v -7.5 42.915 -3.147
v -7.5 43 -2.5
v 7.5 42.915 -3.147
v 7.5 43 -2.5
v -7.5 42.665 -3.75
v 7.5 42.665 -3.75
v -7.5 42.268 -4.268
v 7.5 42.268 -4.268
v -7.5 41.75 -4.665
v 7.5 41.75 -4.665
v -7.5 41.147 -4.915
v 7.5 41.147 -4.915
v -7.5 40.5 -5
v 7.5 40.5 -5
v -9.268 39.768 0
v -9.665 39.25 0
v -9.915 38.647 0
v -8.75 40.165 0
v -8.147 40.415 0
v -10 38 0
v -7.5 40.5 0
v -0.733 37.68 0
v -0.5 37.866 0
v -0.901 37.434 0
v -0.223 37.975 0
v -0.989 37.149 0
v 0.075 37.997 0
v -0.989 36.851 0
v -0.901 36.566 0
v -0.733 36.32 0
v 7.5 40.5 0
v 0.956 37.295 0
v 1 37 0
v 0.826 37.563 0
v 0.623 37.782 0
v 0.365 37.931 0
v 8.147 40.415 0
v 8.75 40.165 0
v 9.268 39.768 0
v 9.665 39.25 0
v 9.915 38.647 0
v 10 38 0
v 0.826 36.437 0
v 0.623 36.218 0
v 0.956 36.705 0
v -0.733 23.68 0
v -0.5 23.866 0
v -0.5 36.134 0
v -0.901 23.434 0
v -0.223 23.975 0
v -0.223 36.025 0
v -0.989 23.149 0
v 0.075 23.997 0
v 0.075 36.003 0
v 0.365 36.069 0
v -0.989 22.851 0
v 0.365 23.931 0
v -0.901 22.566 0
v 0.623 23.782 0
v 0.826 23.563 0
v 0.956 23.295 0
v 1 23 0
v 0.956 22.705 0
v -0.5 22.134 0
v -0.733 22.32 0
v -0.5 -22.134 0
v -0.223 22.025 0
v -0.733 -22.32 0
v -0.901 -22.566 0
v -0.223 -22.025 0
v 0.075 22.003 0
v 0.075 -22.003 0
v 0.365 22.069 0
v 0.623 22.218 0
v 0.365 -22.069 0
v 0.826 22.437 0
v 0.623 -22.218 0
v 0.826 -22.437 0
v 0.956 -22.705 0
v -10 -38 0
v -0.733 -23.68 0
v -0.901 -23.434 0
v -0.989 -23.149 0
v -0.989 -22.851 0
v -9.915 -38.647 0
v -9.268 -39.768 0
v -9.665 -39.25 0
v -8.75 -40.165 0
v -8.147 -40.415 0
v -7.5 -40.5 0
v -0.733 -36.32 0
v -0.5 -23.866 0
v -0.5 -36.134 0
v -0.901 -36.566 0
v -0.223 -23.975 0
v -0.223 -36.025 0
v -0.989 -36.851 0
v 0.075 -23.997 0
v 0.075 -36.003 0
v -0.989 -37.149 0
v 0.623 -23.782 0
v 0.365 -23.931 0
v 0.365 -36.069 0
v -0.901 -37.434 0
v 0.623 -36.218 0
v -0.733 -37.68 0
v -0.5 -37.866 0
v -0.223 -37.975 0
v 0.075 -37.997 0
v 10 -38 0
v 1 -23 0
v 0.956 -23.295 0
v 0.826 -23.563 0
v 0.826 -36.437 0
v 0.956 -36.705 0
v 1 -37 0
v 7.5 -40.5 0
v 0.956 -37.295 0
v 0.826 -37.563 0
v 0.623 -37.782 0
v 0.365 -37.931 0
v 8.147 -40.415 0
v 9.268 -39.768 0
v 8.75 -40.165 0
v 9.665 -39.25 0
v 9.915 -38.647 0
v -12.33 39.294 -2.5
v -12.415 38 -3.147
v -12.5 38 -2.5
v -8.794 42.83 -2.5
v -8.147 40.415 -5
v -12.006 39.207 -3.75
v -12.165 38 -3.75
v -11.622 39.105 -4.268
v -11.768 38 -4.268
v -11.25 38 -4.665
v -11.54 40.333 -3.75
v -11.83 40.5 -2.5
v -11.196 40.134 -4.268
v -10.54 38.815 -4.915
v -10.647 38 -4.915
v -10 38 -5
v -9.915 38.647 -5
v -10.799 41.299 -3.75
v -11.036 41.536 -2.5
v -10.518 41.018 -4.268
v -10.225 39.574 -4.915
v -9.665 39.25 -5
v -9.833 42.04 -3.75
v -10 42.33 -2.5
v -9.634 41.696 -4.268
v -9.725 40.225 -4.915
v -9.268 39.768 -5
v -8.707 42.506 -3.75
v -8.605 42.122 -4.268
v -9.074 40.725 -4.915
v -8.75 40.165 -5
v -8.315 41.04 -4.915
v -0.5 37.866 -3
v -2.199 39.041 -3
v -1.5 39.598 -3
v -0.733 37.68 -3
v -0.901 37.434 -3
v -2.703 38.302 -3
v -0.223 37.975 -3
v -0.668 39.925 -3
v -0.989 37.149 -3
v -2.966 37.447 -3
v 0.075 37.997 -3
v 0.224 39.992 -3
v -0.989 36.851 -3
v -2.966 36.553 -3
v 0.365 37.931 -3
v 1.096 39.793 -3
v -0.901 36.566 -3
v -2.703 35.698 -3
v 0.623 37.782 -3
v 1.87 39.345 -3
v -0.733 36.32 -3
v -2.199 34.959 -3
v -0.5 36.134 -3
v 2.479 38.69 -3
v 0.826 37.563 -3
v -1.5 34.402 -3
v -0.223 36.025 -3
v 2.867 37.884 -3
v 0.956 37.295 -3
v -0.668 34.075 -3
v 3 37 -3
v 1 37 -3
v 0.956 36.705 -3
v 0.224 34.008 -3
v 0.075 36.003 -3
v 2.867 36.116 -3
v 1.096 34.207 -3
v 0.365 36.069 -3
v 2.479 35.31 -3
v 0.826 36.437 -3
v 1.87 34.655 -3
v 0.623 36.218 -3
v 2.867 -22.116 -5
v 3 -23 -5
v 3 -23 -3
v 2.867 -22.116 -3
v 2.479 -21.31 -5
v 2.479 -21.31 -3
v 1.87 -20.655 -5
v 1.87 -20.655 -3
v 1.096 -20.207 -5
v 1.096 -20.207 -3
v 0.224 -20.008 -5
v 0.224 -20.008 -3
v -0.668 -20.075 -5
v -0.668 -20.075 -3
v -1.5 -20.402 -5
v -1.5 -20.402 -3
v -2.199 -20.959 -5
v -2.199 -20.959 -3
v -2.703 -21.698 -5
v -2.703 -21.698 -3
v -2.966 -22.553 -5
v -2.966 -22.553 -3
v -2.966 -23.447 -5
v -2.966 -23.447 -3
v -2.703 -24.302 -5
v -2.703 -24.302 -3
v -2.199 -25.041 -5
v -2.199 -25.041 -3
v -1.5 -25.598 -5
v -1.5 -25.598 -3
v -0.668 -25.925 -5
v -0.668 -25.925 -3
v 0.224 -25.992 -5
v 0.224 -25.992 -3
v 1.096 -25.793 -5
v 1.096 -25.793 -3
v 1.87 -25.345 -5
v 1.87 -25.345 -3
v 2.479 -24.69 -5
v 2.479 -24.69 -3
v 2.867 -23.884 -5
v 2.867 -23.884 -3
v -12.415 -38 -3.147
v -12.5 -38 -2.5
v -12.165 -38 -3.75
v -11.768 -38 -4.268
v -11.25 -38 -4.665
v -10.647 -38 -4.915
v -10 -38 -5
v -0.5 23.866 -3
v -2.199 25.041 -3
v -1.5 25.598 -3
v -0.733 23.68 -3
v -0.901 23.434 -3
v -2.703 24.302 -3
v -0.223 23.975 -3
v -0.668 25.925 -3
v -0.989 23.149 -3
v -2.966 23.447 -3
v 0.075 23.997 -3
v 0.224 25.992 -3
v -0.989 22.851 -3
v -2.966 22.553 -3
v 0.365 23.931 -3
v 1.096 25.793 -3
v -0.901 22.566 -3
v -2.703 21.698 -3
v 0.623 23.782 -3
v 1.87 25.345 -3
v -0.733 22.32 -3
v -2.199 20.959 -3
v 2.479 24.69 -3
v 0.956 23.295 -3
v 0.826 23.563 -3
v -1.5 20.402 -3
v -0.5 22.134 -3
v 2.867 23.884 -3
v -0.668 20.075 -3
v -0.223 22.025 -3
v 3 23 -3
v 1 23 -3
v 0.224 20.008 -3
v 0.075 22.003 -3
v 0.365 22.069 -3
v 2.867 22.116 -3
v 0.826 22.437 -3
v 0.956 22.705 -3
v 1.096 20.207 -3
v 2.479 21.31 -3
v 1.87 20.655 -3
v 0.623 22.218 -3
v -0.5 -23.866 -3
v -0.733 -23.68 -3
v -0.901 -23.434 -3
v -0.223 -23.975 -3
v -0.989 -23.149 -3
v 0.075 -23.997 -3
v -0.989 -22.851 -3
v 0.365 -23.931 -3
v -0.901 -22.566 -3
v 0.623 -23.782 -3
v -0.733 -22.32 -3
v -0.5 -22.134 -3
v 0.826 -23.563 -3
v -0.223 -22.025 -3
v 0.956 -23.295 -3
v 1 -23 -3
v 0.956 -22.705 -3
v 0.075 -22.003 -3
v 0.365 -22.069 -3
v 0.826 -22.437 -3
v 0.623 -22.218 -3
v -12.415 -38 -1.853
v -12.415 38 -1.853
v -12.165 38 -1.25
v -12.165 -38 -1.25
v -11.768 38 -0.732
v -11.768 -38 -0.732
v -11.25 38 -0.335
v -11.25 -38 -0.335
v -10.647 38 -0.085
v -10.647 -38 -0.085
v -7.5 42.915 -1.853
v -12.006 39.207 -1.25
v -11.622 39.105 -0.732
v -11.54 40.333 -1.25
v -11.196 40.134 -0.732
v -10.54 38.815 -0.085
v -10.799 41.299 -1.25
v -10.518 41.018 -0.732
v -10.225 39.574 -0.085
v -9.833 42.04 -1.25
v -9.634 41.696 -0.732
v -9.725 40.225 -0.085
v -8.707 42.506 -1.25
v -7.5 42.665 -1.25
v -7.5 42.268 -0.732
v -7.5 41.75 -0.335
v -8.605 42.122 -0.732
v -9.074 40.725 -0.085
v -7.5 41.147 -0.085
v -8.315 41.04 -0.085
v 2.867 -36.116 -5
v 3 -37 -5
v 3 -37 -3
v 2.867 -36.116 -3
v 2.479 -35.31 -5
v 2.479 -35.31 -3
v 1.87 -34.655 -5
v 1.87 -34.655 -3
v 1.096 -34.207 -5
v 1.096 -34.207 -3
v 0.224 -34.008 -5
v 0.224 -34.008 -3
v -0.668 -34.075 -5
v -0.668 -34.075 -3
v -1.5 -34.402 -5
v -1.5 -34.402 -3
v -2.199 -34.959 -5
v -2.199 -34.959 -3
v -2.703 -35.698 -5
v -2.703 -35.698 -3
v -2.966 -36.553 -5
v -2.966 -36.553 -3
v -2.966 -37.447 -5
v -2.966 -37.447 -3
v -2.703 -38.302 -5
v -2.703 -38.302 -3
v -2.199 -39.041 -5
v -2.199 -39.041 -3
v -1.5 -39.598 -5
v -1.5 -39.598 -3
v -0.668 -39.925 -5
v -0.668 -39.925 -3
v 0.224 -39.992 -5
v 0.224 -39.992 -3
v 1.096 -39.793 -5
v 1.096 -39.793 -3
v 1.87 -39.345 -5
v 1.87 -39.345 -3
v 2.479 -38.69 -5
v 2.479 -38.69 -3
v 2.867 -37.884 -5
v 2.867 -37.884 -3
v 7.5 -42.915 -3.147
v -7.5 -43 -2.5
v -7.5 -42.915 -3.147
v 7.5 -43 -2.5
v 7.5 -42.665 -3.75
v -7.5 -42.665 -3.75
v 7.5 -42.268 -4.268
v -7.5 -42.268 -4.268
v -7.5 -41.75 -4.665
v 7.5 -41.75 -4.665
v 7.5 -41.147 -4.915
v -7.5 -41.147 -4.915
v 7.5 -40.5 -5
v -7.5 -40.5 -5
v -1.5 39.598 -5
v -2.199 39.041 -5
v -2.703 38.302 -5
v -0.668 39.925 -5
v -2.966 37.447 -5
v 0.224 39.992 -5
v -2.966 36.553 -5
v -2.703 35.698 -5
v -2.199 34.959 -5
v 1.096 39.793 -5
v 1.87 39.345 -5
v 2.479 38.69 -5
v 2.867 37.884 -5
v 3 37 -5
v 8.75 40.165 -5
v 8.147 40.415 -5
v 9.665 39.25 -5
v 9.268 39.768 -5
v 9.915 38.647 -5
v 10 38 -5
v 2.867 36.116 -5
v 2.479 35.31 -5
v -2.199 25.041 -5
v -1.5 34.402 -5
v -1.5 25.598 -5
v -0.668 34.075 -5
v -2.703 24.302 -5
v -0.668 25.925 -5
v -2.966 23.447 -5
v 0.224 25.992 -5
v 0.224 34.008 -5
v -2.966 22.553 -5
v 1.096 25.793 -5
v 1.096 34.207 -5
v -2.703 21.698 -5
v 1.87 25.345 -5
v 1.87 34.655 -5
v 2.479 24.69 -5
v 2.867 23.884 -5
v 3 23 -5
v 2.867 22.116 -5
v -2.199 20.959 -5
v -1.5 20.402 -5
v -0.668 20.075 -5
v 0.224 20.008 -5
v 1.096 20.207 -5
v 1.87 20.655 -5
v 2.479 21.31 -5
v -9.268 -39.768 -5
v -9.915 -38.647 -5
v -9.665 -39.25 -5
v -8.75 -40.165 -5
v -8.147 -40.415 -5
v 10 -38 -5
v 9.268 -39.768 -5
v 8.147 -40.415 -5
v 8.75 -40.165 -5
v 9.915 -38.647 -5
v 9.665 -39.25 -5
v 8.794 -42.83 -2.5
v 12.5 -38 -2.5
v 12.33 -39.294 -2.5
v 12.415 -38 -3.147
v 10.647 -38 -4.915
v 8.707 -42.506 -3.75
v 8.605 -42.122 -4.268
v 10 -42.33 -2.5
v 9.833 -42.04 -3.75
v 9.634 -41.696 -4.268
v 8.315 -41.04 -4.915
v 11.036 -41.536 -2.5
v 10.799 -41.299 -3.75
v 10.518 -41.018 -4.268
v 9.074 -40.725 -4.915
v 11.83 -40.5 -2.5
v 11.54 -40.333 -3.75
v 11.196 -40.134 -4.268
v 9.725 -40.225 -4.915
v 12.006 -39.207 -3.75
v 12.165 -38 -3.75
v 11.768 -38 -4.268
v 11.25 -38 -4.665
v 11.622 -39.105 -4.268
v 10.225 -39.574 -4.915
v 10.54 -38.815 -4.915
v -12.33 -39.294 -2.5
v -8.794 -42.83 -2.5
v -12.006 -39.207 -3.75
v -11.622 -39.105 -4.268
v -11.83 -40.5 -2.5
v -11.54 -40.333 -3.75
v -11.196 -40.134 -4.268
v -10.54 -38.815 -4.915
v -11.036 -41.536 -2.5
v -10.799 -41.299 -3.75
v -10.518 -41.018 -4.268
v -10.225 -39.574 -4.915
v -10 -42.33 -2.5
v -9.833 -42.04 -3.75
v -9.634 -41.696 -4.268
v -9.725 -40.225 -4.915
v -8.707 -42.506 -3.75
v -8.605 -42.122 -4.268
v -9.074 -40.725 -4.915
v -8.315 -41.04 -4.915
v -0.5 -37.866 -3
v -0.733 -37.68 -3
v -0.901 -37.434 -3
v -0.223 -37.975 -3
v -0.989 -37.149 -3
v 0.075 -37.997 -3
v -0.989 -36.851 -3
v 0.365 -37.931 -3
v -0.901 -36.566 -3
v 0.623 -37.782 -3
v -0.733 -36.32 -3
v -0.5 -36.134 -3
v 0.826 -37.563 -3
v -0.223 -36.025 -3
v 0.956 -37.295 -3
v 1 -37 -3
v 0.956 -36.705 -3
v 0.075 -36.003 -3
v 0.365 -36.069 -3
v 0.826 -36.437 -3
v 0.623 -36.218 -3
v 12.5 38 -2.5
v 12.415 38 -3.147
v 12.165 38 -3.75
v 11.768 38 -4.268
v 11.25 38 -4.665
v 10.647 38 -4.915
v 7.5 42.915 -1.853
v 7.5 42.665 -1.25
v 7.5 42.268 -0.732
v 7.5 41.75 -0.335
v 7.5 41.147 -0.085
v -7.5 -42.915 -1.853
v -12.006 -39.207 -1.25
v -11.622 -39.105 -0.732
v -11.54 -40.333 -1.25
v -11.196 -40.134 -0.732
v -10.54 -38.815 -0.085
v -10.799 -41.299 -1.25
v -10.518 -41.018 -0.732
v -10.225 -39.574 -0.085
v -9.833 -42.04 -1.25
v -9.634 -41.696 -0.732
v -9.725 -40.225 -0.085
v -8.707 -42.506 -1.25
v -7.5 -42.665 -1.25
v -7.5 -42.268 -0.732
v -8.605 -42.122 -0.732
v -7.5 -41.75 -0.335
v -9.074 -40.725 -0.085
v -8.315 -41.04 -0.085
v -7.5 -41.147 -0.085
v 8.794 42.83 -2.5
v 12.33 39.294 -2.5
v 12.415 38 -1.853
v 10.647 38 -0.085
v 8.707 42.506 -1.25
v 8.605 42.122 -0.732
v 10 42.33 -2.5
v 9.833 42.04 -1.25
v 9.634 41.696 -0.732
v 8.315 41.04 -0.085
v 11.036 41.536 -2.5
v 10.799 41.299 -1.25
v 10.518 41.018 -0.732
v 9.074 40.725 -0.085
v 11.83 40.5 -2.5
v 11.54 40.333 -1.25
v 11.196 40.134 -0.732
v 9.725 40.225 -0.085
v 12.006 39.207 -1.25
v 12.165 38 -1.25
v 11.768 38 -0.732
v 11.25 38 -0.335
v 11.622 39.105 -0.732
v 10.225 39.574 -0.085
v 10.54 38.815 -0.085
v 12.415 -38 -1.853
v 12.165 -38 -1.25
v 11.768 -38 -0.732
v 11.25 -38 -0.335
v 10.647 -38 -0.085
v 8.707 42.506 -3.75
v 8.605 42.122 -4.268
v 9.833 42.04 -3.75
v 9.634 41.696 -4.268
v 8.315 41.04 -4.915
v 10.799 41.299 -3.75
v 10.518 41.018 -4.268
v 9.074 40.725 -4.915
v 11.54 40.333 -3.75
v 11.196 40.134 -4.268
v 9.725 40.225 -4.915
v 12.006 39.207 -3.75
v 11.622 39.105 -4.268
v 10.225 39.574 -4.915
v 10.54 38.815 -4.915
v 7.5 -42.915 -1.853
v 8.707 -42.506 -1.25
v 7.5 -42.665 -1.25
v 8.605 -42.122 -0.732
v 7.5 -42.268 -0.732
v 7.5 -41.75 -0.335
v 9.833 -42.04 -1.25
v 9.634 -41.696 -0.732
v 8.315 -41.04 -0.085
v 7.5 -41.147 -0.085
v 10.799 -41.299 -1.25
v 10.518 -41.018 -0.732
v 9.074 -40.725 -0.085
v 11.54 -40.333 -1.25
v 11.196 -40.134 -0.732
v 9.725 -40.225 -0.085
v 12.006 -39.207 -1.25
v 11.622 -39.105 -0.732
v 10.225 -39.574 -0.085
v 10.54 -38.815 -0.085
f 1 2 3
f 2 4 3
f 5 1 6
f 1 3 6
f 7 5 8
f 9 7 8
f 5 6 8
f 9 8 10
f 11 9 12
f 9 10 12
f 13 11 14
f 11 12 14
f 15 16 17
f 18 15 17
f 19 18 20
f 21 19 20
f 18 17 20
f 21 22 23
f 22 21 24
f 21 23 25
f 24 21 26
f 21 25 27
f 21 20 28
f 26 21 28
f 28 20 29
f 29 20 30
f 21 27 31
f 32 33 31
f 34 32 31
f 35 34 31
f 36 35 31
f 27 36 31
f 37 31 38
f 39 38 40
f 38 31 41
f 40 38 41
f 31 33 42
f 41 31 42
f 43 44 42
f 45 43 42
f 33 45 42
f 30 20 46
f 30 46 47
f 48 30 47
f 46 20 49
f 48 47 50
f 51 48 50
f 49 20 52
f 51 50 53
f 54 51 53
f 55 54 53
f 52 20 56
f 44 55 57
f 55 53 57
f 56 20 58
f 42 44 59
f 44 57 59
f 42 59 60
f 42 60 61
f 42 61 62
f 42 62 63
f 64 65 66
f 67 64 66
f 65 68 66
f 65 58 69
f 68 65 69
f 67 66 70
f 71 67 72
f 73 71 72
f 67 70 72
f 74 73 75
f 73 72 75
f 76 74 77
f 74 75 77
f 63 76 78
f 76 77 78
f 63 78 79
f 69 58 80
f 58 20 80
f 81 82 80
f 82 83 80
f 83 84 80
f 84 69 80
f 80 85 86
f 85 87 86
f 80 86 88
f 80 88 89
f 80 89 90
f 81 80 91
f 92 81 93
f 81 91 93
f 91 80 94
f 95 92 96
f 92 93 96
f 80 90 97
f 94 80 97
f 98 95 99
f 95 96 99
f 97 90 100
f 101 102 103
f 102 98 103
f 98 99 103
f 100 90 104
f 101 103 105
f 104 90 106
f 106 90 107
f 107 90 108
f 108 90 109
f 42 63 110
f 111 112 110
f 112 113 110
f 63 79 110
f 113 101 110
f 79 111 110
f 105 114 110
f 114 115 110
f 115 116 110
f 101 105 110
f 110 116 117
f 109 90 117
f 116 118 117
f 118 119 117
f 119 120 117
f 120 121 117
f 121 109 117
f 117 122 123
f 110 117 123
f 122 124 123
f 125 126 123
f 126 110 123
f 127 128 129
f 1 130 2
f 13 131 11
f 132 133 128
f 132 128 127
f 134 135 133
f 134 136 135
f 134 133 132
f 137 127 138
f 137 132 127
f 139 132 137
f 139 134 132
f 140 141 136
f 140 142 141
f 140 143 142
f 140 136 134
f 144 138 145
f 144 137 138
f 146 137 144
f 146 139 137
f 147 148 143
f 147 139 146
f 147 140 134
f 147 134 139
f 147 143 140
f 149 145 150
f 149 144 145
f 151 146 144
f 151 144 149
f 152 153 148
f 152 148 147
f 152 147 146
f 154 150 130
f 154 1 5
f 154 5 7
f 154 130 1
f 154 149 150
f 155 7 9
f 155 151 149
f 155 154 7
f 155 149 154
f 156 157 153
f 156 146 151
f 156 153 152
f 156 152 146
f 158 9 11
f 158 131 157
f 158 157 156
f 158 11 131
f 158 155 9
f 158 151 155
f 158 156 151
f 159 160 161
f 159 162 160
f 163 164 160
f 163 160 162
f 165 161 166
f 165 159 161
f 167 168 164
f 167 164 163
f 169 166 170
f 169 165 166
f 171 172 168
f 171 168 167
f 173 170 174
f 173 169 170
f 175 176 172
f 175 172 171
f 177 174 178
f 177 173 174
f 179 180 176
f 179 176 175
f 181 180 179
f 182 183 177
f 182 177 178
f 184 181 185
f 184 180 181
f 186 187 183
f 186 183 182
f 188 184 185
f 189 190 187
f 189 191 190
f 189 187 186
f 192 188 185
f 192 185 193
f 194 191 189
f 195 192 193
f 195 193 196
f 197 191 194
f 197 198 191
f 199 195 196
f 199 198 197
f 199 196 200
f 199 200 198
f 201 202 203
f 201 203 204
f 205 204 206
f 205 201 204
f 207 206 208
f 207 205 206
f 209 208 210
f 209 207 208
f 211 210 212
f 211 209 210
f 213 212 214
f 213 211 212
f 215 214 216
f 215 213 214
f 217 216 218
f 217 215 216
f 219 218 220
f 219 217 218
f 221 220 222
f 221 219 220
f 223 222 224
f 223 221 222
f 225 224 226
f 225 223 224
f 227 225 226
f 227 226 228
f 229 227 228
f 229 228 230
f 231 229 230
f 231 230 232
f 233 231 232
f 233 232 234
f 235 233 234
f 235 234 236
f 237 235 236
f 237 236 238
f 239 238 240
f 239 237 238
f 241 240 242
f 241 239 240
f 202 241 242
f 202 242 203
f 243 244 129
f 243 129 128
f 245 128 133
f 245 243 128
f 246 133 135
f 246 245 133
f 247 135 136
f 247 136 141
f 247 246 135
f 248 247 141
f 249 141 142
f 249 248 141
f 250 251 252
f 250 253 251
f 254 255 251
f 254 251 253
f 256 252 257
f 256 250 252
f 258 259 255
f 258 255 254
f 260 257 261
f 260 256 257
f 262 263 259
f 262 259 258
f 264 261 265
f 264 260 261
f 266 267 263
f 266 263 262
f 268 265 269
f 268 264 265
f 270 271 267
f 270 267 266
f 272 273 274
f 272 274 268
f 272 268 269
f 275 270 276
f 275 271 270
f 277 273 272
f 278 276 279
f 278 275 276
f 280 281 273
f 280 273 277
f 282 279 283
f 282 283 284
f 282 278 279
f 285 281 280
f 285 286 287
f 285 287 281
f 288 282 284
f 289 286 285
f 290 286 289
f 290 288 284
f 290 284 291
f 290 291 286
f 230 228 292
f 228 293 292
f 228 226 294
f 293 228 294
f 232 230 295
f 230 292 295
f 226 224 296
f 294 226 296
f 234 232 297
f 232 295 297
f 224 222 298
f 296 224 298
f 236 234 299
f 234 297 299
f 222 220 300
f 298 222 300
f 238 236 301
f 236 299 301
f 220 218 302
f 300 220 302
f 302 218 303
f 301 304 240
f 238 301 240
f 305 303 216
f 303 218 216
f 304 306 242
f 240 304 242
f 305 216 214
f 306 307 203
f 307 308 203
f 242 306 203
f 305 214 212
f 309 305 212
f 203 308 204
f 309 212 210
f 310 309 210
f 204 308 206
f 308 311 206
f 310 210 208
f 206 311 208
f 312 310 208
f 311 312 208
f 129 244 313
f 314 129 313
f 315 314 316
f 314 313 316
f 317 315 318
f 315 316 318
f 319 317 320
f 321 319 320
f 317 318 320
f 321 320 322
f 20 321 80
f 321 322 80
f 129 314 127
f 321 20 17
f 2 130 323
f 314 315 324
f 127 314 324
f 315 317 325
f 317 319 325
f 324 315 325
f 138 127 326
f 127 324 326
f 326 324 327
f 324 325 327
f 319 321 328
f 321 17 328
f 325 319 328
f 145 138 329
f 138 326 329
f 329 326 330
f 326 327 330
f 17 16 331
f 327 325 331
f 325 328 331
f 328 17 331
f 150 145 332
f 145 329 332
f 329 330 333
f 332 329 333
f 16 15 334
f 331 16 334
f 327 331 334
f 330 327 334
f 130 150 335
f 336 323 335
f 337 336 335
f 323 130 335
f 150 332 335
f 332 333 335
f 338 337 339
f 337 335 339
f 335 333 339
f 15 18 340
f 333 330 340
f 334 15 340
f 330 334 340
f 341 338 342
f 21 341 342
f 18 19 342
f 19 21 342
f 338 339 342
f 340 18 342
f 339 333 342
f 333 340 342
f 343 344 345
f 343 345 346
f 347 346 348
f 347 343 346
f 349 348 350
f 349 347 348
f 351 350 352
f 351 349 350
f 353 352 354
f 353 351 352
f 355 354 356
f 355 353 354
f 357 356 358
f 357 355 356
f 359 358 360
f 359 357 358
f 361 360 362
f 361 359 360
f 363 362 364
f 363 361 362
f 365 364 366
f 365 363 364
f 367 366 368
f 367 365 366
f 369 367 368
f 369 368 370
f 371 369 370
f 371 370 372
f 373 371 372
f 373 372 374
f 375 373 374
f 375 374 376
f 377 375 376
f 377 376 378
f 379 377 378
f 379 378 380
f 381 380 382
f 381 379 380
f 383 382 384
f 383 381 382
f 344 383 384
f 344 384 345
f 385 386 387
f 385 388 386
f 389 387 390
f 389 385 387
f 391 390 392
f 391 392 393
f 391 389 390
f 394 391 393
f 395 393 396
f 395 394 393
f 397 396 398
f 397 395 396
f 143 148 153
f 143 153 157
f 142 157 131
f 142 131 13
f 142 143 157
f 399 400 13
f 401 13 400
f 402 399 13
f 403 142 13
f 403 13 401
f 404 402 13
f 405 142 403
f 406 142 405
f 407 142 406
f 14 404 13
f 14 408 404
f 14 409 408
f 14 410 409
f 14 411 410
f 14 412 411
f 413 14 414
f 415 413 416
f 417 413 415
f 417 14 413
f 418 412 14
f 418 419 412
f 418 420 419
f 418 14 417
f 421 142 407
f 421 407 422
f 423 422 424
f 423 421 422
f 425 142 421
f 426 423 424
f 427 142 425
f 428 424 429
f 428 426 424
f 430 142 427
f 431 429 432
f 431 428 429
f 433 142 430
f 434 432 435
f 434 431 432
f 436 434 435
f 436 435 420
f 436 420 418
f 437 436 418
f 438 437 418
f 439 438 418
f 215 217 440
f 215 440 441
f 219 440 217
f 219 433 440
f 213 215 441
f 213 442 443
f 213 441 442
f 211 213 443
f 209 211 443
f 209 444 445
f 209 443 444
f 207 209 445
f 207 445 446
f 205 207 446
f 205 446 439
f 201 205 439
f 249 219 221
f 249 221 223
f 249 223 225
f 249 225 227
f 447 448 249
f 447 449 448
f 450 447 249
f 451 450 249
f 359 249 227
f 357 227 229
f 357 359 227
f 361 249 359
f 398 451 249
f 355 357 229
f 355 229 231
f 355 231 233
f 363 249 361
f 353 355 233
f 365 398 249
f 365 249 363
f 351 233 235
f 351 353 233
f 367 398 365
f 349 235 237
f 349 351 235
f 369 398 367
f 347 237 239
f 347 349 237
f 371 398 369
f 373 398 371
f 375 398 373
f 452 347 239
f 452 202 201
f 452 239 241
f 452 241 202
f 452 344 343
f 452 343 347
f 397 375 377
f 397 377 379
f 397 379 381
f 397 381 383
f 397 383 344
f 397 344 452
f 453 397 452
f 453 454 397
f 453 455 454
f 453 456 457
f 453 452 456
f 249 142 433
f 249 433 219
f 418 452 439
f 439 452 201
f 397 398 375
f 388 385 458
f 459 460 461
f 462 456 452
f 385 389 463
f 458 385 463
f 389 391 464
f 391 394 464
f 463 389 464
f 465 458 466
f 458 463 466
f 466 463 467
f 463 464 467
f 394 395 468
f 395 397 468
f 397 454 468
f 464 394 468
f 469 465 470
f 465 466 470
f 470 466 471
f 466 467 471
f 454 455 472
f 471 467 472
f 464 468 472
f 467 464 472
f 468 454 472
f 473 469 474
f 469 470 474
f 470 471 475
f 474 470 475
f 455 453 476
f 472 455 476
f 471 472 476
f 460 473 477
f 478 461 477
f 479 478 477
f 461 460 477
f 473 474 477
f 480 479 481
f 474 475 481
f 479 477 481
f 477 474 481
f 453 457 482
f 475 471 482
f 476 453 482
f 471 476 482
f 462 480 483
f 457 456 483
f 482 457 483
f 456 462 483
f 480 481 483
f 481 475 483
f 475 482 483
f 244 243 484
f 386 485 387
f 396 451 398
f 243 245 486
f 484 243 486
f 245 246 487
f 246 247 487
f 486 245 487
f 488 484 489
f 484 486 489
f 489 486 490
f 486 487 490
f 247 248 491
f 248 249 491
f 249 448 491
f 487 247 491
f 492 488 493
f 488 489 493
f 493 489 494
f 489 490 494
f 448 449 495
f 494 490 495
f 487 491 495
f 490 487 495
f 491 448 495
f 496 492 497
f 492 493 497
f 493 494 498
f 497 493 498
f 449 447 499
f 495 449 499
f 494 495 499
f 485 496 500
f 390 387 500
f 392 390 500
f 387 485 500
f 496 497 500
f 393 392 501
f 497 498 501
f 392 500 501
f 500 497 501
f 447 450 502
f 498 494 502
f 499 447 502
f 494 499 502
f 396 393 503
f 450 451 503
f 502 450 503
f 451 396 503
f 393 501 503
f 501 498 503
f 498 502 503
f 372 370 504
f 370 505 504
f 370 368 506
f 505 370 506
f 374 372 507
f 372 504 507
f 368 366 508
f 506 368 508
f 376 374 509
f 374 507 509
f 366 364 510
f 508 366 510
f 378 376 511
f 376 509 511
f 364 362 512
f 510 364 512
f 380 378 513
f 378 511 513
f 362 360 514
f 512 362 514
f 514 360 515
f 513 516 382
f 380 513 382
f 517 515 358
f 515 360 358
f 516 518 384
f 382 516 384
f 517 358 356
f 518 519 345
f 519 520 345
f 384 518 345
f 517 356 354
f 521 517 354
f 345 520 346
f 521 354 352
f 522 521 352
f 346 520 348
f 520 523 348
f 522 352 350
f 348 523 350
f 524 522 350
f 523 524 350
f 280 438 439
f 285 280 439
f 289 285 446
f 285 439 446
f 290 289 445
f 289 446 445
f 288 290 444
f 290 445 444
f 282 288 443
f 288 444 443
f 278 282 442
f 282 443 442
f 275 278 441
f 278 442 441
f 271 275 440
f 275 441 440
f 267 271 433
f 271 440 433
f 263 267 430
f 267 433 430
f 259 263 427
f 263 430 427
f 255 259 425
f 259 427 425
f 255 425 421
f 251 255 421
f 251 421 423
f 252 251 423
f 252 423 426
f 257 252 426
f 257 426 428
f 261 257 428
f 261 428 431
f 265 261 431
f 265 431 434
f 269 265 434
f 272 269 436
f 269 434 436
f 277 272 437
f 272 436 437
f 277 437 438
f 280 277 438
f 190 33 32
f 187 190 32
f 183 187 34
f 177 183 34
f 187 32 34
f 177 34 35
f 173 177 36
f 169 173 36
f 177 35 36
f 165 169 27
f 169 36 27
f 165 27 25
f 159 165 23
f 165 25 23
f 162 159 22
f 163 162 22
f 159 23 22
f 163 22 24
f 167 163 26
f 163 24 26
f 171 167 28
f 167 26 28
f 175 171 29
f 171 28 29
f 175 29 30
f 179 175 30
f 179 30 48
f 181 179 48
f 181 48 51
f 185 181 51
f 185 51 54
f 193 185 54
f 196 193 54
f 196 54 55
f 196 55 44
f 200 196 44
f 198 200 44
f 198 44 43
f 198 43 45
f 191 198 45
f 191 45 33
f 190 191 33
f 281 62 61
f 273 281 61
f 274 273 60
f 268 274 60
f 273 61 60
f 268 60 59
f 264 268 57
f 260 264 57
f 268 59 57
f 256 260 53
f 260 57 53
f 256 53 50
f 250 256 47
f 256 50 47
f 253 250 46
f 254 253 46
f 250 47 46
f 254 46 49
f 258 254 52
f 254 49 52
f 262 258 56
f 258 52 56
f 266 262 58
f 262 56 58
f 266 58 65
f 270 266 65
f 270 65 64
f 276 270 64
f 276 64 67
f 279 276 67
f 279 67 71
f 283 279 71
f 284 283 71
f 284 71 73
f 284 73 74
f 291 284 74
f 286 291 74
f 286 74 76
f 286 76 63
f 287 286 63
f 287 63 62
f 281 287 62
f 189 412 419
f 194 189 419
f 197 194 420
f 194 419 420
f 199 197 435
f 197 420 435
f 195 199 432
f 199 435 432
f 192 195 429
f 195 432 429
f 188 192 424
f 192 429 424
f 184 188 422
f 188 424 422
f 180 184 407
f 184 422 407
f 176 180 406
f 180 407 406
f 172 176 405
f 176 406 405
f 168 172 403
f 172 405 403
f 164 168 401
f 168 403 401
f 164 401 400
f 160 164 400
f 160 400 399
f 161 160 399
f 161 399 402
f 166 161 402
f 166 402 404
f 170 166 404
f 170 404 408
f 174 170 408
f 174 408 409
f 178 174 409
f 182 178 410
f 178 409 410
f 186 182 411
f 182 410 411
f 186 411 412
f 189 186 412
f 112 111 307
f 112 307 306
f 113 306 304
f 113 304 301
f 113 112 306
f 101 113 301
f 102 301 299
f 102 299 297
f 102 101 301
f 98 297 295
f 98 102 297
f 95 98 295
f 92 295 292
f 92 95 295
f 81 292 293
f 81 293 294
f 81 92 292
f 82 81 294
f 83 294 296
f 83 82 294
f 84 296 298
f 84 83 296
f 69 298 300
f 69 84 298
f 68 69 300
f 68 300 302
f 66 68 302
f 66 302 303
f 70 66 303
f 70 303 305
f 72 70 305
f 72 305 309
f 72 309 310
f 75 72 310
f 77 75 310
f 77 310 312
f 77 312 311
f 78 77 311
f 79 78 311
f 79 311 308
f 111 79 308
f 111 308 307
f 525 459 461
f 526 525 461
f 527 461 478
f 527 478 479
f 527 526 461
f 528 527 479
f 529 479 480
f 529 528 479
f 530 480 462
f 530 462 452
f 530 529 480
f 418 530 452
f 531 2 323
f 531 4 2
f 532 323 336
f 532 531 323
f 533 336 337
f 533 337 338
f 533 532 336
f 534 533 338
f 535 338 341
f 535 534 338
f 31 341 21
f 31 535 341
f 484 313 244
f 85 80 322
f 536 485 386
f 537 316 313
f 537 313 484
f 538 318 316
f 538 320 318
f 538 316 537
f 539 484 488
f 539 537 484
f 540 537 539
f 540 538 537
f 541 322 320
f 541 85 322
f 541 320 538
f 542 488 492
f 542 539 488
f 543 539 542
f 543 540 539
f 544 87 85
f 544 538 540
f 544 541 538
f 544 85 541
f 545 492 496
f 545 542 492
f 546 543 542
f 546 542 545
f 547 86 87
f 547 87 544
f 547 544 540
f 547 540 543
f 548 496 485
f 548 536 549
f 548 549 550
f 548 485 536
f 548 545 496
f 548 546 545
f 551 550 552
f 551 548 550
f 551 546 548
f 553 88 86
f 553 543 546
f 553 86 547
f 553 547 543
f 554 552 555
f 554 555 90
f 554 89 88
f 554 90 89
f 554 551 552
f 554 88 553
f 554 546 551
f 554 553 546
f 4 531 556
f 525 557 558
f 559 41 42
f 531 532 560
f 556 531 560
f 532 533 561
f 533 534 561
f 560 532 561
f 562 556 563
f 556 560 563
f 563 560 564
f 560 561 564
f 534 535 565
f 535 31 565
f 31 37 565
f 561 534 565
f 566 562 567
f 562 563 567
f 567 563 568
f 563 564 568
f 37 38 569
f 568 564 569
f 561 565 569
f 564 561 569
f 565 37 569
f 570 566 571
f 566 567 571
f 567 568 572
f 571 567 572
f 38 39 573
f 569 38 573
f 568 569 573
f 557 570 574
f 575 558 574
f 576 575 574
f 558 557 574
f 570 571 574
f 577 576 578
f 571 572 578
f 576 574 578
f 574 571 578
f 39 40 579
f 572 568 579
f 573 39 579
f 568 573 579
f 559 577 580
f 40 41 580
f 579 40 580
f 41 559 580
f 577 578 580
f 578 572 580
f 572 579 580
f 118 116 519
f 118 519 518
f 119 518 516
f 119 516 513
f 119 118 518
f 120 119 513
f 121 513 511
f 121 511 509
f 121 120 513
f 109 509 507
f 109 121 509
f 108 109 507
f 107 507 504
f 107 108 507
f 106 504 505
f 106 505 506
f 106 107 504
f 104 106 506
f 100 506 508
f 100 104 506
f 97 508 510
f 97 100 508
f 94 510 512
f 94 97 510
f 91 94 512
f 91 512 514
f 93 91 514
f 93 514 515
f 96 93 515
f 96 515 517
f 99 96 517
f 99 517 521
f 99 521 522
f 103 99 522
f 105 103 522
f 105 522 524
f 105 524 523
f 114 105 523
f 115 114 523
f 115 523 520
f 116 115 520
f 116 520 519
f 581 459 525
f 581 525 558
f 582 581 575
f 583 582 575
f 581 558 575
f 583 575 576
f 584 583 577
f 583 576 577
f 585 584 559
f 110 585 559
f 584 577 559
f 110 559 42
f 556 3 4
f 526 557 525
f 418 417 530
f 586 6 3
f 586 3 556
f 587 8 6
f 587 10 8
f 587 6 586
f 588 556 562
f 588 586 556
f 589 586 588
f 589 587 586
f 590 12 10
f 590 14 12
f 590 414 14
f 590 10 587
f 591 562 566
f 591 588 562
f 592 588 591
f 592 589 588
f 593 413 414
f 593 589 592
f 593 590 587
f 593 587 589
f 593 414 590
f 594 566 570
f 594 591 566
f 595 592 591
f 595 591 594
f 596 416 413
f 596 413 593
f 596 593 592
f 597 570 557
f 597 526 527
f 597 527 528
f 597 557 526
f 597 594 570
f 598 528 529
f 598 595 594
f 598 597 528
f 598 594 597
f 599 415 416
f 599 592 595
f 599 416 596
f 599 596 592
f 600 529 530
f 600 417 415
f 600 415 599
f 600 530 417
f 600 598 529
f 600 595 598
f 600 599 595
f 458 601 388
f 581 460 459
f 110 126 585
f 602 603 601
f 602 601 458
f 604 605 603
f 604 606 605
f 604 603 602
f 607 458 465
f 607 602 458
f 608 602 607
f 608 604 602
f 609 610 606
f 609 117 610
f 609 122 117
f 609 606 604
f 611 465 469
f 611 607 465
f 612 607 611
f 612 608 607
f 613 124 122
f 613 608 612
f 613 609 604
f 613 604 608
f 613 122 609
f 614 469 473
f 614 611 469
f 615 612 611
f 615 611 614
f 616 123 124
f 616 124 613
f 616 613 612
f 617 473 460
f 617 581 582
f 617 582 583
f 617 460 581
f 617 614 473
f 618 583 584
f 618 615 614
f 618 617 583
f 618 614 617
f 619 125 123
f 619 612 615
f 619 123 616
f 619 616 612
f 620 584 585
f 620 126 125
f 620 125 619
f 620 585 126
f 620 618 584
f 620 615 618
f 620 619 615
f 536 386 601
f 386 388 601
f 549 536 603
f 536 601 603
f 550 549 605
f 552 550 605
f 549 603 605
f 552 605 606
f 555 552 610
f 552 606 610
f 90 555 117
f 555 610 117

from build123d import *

# Parameters (mm, degrees)
F0_W     = 25
F0_H     = 43
F1_DEPTH = 5
F2_R     = 1
F3_DEPTH = 5.001
F4_R     = 5
F5_R     = 2.49999
F6_R     = 3
F7_DEPTH = 2


# Not quite as in the source:
# - a fillet or chamfer is up to 0.001 mm smaller than in the source, because OpenCascade refuses the exact size


with BuildPart() as f1:
    # F0 (on Top) → F1 (new body)
    with BuildSketch(Plane.XY):
        with Locations((0, 21.5)):
            Rectangle(F0_W, F0_H)
    extrude(amount=-F1_DEPTH)

    # F2 (on face) → F3 (cut, through all)
    with BuildSketch(Plane.XY):
        with Locations((0, 37)):
            Circle(F2_R)
        with Locations((0, 23)):
            Circle(F2_R)
    extrude(amount=-F3_DEPTH, mode=Mode.SUBTRACT)

    # F4
    f4_edges = [f1.edges().sort_by_distance(p)[0] for p in [
        (-12.5, 43, -2.5),
        (12.5, 43, -2.5),
    ]]
    fillet(f4_edges, radius=F4_R)

    # F5 (radius 2.5 in the source; OpenCascade refuses exactly that, so slightly less here)
    f5_edges = [f1.edges().sort_by_distance(p)[0] for p in [
        (-12.5, 19, 0),
        (-12.5, 19, -5),
    ]]
    fillet(f5_edges, radius=F5_R)

    # F6 (on face) → F7 (cut)
    with BuildSketch(Plane(origin=(0, 0, -5), x_dir=(1, 0, 0), z_dir=(0, 0, -1))):
        with Locations((0, -37)):
            Circle(F6_R)
        with Locations((0, -23)):
            Circle(F6_R)
    extrude(amount=-F7_DEPTH, mode=Mode.SUBTRACT)

    # F8: F1 across plane


with BuildPart() as f1_1:
    add(f1.part)
    add(f1.part.mirror(Plane.XZ))


solid = f1_1.part
